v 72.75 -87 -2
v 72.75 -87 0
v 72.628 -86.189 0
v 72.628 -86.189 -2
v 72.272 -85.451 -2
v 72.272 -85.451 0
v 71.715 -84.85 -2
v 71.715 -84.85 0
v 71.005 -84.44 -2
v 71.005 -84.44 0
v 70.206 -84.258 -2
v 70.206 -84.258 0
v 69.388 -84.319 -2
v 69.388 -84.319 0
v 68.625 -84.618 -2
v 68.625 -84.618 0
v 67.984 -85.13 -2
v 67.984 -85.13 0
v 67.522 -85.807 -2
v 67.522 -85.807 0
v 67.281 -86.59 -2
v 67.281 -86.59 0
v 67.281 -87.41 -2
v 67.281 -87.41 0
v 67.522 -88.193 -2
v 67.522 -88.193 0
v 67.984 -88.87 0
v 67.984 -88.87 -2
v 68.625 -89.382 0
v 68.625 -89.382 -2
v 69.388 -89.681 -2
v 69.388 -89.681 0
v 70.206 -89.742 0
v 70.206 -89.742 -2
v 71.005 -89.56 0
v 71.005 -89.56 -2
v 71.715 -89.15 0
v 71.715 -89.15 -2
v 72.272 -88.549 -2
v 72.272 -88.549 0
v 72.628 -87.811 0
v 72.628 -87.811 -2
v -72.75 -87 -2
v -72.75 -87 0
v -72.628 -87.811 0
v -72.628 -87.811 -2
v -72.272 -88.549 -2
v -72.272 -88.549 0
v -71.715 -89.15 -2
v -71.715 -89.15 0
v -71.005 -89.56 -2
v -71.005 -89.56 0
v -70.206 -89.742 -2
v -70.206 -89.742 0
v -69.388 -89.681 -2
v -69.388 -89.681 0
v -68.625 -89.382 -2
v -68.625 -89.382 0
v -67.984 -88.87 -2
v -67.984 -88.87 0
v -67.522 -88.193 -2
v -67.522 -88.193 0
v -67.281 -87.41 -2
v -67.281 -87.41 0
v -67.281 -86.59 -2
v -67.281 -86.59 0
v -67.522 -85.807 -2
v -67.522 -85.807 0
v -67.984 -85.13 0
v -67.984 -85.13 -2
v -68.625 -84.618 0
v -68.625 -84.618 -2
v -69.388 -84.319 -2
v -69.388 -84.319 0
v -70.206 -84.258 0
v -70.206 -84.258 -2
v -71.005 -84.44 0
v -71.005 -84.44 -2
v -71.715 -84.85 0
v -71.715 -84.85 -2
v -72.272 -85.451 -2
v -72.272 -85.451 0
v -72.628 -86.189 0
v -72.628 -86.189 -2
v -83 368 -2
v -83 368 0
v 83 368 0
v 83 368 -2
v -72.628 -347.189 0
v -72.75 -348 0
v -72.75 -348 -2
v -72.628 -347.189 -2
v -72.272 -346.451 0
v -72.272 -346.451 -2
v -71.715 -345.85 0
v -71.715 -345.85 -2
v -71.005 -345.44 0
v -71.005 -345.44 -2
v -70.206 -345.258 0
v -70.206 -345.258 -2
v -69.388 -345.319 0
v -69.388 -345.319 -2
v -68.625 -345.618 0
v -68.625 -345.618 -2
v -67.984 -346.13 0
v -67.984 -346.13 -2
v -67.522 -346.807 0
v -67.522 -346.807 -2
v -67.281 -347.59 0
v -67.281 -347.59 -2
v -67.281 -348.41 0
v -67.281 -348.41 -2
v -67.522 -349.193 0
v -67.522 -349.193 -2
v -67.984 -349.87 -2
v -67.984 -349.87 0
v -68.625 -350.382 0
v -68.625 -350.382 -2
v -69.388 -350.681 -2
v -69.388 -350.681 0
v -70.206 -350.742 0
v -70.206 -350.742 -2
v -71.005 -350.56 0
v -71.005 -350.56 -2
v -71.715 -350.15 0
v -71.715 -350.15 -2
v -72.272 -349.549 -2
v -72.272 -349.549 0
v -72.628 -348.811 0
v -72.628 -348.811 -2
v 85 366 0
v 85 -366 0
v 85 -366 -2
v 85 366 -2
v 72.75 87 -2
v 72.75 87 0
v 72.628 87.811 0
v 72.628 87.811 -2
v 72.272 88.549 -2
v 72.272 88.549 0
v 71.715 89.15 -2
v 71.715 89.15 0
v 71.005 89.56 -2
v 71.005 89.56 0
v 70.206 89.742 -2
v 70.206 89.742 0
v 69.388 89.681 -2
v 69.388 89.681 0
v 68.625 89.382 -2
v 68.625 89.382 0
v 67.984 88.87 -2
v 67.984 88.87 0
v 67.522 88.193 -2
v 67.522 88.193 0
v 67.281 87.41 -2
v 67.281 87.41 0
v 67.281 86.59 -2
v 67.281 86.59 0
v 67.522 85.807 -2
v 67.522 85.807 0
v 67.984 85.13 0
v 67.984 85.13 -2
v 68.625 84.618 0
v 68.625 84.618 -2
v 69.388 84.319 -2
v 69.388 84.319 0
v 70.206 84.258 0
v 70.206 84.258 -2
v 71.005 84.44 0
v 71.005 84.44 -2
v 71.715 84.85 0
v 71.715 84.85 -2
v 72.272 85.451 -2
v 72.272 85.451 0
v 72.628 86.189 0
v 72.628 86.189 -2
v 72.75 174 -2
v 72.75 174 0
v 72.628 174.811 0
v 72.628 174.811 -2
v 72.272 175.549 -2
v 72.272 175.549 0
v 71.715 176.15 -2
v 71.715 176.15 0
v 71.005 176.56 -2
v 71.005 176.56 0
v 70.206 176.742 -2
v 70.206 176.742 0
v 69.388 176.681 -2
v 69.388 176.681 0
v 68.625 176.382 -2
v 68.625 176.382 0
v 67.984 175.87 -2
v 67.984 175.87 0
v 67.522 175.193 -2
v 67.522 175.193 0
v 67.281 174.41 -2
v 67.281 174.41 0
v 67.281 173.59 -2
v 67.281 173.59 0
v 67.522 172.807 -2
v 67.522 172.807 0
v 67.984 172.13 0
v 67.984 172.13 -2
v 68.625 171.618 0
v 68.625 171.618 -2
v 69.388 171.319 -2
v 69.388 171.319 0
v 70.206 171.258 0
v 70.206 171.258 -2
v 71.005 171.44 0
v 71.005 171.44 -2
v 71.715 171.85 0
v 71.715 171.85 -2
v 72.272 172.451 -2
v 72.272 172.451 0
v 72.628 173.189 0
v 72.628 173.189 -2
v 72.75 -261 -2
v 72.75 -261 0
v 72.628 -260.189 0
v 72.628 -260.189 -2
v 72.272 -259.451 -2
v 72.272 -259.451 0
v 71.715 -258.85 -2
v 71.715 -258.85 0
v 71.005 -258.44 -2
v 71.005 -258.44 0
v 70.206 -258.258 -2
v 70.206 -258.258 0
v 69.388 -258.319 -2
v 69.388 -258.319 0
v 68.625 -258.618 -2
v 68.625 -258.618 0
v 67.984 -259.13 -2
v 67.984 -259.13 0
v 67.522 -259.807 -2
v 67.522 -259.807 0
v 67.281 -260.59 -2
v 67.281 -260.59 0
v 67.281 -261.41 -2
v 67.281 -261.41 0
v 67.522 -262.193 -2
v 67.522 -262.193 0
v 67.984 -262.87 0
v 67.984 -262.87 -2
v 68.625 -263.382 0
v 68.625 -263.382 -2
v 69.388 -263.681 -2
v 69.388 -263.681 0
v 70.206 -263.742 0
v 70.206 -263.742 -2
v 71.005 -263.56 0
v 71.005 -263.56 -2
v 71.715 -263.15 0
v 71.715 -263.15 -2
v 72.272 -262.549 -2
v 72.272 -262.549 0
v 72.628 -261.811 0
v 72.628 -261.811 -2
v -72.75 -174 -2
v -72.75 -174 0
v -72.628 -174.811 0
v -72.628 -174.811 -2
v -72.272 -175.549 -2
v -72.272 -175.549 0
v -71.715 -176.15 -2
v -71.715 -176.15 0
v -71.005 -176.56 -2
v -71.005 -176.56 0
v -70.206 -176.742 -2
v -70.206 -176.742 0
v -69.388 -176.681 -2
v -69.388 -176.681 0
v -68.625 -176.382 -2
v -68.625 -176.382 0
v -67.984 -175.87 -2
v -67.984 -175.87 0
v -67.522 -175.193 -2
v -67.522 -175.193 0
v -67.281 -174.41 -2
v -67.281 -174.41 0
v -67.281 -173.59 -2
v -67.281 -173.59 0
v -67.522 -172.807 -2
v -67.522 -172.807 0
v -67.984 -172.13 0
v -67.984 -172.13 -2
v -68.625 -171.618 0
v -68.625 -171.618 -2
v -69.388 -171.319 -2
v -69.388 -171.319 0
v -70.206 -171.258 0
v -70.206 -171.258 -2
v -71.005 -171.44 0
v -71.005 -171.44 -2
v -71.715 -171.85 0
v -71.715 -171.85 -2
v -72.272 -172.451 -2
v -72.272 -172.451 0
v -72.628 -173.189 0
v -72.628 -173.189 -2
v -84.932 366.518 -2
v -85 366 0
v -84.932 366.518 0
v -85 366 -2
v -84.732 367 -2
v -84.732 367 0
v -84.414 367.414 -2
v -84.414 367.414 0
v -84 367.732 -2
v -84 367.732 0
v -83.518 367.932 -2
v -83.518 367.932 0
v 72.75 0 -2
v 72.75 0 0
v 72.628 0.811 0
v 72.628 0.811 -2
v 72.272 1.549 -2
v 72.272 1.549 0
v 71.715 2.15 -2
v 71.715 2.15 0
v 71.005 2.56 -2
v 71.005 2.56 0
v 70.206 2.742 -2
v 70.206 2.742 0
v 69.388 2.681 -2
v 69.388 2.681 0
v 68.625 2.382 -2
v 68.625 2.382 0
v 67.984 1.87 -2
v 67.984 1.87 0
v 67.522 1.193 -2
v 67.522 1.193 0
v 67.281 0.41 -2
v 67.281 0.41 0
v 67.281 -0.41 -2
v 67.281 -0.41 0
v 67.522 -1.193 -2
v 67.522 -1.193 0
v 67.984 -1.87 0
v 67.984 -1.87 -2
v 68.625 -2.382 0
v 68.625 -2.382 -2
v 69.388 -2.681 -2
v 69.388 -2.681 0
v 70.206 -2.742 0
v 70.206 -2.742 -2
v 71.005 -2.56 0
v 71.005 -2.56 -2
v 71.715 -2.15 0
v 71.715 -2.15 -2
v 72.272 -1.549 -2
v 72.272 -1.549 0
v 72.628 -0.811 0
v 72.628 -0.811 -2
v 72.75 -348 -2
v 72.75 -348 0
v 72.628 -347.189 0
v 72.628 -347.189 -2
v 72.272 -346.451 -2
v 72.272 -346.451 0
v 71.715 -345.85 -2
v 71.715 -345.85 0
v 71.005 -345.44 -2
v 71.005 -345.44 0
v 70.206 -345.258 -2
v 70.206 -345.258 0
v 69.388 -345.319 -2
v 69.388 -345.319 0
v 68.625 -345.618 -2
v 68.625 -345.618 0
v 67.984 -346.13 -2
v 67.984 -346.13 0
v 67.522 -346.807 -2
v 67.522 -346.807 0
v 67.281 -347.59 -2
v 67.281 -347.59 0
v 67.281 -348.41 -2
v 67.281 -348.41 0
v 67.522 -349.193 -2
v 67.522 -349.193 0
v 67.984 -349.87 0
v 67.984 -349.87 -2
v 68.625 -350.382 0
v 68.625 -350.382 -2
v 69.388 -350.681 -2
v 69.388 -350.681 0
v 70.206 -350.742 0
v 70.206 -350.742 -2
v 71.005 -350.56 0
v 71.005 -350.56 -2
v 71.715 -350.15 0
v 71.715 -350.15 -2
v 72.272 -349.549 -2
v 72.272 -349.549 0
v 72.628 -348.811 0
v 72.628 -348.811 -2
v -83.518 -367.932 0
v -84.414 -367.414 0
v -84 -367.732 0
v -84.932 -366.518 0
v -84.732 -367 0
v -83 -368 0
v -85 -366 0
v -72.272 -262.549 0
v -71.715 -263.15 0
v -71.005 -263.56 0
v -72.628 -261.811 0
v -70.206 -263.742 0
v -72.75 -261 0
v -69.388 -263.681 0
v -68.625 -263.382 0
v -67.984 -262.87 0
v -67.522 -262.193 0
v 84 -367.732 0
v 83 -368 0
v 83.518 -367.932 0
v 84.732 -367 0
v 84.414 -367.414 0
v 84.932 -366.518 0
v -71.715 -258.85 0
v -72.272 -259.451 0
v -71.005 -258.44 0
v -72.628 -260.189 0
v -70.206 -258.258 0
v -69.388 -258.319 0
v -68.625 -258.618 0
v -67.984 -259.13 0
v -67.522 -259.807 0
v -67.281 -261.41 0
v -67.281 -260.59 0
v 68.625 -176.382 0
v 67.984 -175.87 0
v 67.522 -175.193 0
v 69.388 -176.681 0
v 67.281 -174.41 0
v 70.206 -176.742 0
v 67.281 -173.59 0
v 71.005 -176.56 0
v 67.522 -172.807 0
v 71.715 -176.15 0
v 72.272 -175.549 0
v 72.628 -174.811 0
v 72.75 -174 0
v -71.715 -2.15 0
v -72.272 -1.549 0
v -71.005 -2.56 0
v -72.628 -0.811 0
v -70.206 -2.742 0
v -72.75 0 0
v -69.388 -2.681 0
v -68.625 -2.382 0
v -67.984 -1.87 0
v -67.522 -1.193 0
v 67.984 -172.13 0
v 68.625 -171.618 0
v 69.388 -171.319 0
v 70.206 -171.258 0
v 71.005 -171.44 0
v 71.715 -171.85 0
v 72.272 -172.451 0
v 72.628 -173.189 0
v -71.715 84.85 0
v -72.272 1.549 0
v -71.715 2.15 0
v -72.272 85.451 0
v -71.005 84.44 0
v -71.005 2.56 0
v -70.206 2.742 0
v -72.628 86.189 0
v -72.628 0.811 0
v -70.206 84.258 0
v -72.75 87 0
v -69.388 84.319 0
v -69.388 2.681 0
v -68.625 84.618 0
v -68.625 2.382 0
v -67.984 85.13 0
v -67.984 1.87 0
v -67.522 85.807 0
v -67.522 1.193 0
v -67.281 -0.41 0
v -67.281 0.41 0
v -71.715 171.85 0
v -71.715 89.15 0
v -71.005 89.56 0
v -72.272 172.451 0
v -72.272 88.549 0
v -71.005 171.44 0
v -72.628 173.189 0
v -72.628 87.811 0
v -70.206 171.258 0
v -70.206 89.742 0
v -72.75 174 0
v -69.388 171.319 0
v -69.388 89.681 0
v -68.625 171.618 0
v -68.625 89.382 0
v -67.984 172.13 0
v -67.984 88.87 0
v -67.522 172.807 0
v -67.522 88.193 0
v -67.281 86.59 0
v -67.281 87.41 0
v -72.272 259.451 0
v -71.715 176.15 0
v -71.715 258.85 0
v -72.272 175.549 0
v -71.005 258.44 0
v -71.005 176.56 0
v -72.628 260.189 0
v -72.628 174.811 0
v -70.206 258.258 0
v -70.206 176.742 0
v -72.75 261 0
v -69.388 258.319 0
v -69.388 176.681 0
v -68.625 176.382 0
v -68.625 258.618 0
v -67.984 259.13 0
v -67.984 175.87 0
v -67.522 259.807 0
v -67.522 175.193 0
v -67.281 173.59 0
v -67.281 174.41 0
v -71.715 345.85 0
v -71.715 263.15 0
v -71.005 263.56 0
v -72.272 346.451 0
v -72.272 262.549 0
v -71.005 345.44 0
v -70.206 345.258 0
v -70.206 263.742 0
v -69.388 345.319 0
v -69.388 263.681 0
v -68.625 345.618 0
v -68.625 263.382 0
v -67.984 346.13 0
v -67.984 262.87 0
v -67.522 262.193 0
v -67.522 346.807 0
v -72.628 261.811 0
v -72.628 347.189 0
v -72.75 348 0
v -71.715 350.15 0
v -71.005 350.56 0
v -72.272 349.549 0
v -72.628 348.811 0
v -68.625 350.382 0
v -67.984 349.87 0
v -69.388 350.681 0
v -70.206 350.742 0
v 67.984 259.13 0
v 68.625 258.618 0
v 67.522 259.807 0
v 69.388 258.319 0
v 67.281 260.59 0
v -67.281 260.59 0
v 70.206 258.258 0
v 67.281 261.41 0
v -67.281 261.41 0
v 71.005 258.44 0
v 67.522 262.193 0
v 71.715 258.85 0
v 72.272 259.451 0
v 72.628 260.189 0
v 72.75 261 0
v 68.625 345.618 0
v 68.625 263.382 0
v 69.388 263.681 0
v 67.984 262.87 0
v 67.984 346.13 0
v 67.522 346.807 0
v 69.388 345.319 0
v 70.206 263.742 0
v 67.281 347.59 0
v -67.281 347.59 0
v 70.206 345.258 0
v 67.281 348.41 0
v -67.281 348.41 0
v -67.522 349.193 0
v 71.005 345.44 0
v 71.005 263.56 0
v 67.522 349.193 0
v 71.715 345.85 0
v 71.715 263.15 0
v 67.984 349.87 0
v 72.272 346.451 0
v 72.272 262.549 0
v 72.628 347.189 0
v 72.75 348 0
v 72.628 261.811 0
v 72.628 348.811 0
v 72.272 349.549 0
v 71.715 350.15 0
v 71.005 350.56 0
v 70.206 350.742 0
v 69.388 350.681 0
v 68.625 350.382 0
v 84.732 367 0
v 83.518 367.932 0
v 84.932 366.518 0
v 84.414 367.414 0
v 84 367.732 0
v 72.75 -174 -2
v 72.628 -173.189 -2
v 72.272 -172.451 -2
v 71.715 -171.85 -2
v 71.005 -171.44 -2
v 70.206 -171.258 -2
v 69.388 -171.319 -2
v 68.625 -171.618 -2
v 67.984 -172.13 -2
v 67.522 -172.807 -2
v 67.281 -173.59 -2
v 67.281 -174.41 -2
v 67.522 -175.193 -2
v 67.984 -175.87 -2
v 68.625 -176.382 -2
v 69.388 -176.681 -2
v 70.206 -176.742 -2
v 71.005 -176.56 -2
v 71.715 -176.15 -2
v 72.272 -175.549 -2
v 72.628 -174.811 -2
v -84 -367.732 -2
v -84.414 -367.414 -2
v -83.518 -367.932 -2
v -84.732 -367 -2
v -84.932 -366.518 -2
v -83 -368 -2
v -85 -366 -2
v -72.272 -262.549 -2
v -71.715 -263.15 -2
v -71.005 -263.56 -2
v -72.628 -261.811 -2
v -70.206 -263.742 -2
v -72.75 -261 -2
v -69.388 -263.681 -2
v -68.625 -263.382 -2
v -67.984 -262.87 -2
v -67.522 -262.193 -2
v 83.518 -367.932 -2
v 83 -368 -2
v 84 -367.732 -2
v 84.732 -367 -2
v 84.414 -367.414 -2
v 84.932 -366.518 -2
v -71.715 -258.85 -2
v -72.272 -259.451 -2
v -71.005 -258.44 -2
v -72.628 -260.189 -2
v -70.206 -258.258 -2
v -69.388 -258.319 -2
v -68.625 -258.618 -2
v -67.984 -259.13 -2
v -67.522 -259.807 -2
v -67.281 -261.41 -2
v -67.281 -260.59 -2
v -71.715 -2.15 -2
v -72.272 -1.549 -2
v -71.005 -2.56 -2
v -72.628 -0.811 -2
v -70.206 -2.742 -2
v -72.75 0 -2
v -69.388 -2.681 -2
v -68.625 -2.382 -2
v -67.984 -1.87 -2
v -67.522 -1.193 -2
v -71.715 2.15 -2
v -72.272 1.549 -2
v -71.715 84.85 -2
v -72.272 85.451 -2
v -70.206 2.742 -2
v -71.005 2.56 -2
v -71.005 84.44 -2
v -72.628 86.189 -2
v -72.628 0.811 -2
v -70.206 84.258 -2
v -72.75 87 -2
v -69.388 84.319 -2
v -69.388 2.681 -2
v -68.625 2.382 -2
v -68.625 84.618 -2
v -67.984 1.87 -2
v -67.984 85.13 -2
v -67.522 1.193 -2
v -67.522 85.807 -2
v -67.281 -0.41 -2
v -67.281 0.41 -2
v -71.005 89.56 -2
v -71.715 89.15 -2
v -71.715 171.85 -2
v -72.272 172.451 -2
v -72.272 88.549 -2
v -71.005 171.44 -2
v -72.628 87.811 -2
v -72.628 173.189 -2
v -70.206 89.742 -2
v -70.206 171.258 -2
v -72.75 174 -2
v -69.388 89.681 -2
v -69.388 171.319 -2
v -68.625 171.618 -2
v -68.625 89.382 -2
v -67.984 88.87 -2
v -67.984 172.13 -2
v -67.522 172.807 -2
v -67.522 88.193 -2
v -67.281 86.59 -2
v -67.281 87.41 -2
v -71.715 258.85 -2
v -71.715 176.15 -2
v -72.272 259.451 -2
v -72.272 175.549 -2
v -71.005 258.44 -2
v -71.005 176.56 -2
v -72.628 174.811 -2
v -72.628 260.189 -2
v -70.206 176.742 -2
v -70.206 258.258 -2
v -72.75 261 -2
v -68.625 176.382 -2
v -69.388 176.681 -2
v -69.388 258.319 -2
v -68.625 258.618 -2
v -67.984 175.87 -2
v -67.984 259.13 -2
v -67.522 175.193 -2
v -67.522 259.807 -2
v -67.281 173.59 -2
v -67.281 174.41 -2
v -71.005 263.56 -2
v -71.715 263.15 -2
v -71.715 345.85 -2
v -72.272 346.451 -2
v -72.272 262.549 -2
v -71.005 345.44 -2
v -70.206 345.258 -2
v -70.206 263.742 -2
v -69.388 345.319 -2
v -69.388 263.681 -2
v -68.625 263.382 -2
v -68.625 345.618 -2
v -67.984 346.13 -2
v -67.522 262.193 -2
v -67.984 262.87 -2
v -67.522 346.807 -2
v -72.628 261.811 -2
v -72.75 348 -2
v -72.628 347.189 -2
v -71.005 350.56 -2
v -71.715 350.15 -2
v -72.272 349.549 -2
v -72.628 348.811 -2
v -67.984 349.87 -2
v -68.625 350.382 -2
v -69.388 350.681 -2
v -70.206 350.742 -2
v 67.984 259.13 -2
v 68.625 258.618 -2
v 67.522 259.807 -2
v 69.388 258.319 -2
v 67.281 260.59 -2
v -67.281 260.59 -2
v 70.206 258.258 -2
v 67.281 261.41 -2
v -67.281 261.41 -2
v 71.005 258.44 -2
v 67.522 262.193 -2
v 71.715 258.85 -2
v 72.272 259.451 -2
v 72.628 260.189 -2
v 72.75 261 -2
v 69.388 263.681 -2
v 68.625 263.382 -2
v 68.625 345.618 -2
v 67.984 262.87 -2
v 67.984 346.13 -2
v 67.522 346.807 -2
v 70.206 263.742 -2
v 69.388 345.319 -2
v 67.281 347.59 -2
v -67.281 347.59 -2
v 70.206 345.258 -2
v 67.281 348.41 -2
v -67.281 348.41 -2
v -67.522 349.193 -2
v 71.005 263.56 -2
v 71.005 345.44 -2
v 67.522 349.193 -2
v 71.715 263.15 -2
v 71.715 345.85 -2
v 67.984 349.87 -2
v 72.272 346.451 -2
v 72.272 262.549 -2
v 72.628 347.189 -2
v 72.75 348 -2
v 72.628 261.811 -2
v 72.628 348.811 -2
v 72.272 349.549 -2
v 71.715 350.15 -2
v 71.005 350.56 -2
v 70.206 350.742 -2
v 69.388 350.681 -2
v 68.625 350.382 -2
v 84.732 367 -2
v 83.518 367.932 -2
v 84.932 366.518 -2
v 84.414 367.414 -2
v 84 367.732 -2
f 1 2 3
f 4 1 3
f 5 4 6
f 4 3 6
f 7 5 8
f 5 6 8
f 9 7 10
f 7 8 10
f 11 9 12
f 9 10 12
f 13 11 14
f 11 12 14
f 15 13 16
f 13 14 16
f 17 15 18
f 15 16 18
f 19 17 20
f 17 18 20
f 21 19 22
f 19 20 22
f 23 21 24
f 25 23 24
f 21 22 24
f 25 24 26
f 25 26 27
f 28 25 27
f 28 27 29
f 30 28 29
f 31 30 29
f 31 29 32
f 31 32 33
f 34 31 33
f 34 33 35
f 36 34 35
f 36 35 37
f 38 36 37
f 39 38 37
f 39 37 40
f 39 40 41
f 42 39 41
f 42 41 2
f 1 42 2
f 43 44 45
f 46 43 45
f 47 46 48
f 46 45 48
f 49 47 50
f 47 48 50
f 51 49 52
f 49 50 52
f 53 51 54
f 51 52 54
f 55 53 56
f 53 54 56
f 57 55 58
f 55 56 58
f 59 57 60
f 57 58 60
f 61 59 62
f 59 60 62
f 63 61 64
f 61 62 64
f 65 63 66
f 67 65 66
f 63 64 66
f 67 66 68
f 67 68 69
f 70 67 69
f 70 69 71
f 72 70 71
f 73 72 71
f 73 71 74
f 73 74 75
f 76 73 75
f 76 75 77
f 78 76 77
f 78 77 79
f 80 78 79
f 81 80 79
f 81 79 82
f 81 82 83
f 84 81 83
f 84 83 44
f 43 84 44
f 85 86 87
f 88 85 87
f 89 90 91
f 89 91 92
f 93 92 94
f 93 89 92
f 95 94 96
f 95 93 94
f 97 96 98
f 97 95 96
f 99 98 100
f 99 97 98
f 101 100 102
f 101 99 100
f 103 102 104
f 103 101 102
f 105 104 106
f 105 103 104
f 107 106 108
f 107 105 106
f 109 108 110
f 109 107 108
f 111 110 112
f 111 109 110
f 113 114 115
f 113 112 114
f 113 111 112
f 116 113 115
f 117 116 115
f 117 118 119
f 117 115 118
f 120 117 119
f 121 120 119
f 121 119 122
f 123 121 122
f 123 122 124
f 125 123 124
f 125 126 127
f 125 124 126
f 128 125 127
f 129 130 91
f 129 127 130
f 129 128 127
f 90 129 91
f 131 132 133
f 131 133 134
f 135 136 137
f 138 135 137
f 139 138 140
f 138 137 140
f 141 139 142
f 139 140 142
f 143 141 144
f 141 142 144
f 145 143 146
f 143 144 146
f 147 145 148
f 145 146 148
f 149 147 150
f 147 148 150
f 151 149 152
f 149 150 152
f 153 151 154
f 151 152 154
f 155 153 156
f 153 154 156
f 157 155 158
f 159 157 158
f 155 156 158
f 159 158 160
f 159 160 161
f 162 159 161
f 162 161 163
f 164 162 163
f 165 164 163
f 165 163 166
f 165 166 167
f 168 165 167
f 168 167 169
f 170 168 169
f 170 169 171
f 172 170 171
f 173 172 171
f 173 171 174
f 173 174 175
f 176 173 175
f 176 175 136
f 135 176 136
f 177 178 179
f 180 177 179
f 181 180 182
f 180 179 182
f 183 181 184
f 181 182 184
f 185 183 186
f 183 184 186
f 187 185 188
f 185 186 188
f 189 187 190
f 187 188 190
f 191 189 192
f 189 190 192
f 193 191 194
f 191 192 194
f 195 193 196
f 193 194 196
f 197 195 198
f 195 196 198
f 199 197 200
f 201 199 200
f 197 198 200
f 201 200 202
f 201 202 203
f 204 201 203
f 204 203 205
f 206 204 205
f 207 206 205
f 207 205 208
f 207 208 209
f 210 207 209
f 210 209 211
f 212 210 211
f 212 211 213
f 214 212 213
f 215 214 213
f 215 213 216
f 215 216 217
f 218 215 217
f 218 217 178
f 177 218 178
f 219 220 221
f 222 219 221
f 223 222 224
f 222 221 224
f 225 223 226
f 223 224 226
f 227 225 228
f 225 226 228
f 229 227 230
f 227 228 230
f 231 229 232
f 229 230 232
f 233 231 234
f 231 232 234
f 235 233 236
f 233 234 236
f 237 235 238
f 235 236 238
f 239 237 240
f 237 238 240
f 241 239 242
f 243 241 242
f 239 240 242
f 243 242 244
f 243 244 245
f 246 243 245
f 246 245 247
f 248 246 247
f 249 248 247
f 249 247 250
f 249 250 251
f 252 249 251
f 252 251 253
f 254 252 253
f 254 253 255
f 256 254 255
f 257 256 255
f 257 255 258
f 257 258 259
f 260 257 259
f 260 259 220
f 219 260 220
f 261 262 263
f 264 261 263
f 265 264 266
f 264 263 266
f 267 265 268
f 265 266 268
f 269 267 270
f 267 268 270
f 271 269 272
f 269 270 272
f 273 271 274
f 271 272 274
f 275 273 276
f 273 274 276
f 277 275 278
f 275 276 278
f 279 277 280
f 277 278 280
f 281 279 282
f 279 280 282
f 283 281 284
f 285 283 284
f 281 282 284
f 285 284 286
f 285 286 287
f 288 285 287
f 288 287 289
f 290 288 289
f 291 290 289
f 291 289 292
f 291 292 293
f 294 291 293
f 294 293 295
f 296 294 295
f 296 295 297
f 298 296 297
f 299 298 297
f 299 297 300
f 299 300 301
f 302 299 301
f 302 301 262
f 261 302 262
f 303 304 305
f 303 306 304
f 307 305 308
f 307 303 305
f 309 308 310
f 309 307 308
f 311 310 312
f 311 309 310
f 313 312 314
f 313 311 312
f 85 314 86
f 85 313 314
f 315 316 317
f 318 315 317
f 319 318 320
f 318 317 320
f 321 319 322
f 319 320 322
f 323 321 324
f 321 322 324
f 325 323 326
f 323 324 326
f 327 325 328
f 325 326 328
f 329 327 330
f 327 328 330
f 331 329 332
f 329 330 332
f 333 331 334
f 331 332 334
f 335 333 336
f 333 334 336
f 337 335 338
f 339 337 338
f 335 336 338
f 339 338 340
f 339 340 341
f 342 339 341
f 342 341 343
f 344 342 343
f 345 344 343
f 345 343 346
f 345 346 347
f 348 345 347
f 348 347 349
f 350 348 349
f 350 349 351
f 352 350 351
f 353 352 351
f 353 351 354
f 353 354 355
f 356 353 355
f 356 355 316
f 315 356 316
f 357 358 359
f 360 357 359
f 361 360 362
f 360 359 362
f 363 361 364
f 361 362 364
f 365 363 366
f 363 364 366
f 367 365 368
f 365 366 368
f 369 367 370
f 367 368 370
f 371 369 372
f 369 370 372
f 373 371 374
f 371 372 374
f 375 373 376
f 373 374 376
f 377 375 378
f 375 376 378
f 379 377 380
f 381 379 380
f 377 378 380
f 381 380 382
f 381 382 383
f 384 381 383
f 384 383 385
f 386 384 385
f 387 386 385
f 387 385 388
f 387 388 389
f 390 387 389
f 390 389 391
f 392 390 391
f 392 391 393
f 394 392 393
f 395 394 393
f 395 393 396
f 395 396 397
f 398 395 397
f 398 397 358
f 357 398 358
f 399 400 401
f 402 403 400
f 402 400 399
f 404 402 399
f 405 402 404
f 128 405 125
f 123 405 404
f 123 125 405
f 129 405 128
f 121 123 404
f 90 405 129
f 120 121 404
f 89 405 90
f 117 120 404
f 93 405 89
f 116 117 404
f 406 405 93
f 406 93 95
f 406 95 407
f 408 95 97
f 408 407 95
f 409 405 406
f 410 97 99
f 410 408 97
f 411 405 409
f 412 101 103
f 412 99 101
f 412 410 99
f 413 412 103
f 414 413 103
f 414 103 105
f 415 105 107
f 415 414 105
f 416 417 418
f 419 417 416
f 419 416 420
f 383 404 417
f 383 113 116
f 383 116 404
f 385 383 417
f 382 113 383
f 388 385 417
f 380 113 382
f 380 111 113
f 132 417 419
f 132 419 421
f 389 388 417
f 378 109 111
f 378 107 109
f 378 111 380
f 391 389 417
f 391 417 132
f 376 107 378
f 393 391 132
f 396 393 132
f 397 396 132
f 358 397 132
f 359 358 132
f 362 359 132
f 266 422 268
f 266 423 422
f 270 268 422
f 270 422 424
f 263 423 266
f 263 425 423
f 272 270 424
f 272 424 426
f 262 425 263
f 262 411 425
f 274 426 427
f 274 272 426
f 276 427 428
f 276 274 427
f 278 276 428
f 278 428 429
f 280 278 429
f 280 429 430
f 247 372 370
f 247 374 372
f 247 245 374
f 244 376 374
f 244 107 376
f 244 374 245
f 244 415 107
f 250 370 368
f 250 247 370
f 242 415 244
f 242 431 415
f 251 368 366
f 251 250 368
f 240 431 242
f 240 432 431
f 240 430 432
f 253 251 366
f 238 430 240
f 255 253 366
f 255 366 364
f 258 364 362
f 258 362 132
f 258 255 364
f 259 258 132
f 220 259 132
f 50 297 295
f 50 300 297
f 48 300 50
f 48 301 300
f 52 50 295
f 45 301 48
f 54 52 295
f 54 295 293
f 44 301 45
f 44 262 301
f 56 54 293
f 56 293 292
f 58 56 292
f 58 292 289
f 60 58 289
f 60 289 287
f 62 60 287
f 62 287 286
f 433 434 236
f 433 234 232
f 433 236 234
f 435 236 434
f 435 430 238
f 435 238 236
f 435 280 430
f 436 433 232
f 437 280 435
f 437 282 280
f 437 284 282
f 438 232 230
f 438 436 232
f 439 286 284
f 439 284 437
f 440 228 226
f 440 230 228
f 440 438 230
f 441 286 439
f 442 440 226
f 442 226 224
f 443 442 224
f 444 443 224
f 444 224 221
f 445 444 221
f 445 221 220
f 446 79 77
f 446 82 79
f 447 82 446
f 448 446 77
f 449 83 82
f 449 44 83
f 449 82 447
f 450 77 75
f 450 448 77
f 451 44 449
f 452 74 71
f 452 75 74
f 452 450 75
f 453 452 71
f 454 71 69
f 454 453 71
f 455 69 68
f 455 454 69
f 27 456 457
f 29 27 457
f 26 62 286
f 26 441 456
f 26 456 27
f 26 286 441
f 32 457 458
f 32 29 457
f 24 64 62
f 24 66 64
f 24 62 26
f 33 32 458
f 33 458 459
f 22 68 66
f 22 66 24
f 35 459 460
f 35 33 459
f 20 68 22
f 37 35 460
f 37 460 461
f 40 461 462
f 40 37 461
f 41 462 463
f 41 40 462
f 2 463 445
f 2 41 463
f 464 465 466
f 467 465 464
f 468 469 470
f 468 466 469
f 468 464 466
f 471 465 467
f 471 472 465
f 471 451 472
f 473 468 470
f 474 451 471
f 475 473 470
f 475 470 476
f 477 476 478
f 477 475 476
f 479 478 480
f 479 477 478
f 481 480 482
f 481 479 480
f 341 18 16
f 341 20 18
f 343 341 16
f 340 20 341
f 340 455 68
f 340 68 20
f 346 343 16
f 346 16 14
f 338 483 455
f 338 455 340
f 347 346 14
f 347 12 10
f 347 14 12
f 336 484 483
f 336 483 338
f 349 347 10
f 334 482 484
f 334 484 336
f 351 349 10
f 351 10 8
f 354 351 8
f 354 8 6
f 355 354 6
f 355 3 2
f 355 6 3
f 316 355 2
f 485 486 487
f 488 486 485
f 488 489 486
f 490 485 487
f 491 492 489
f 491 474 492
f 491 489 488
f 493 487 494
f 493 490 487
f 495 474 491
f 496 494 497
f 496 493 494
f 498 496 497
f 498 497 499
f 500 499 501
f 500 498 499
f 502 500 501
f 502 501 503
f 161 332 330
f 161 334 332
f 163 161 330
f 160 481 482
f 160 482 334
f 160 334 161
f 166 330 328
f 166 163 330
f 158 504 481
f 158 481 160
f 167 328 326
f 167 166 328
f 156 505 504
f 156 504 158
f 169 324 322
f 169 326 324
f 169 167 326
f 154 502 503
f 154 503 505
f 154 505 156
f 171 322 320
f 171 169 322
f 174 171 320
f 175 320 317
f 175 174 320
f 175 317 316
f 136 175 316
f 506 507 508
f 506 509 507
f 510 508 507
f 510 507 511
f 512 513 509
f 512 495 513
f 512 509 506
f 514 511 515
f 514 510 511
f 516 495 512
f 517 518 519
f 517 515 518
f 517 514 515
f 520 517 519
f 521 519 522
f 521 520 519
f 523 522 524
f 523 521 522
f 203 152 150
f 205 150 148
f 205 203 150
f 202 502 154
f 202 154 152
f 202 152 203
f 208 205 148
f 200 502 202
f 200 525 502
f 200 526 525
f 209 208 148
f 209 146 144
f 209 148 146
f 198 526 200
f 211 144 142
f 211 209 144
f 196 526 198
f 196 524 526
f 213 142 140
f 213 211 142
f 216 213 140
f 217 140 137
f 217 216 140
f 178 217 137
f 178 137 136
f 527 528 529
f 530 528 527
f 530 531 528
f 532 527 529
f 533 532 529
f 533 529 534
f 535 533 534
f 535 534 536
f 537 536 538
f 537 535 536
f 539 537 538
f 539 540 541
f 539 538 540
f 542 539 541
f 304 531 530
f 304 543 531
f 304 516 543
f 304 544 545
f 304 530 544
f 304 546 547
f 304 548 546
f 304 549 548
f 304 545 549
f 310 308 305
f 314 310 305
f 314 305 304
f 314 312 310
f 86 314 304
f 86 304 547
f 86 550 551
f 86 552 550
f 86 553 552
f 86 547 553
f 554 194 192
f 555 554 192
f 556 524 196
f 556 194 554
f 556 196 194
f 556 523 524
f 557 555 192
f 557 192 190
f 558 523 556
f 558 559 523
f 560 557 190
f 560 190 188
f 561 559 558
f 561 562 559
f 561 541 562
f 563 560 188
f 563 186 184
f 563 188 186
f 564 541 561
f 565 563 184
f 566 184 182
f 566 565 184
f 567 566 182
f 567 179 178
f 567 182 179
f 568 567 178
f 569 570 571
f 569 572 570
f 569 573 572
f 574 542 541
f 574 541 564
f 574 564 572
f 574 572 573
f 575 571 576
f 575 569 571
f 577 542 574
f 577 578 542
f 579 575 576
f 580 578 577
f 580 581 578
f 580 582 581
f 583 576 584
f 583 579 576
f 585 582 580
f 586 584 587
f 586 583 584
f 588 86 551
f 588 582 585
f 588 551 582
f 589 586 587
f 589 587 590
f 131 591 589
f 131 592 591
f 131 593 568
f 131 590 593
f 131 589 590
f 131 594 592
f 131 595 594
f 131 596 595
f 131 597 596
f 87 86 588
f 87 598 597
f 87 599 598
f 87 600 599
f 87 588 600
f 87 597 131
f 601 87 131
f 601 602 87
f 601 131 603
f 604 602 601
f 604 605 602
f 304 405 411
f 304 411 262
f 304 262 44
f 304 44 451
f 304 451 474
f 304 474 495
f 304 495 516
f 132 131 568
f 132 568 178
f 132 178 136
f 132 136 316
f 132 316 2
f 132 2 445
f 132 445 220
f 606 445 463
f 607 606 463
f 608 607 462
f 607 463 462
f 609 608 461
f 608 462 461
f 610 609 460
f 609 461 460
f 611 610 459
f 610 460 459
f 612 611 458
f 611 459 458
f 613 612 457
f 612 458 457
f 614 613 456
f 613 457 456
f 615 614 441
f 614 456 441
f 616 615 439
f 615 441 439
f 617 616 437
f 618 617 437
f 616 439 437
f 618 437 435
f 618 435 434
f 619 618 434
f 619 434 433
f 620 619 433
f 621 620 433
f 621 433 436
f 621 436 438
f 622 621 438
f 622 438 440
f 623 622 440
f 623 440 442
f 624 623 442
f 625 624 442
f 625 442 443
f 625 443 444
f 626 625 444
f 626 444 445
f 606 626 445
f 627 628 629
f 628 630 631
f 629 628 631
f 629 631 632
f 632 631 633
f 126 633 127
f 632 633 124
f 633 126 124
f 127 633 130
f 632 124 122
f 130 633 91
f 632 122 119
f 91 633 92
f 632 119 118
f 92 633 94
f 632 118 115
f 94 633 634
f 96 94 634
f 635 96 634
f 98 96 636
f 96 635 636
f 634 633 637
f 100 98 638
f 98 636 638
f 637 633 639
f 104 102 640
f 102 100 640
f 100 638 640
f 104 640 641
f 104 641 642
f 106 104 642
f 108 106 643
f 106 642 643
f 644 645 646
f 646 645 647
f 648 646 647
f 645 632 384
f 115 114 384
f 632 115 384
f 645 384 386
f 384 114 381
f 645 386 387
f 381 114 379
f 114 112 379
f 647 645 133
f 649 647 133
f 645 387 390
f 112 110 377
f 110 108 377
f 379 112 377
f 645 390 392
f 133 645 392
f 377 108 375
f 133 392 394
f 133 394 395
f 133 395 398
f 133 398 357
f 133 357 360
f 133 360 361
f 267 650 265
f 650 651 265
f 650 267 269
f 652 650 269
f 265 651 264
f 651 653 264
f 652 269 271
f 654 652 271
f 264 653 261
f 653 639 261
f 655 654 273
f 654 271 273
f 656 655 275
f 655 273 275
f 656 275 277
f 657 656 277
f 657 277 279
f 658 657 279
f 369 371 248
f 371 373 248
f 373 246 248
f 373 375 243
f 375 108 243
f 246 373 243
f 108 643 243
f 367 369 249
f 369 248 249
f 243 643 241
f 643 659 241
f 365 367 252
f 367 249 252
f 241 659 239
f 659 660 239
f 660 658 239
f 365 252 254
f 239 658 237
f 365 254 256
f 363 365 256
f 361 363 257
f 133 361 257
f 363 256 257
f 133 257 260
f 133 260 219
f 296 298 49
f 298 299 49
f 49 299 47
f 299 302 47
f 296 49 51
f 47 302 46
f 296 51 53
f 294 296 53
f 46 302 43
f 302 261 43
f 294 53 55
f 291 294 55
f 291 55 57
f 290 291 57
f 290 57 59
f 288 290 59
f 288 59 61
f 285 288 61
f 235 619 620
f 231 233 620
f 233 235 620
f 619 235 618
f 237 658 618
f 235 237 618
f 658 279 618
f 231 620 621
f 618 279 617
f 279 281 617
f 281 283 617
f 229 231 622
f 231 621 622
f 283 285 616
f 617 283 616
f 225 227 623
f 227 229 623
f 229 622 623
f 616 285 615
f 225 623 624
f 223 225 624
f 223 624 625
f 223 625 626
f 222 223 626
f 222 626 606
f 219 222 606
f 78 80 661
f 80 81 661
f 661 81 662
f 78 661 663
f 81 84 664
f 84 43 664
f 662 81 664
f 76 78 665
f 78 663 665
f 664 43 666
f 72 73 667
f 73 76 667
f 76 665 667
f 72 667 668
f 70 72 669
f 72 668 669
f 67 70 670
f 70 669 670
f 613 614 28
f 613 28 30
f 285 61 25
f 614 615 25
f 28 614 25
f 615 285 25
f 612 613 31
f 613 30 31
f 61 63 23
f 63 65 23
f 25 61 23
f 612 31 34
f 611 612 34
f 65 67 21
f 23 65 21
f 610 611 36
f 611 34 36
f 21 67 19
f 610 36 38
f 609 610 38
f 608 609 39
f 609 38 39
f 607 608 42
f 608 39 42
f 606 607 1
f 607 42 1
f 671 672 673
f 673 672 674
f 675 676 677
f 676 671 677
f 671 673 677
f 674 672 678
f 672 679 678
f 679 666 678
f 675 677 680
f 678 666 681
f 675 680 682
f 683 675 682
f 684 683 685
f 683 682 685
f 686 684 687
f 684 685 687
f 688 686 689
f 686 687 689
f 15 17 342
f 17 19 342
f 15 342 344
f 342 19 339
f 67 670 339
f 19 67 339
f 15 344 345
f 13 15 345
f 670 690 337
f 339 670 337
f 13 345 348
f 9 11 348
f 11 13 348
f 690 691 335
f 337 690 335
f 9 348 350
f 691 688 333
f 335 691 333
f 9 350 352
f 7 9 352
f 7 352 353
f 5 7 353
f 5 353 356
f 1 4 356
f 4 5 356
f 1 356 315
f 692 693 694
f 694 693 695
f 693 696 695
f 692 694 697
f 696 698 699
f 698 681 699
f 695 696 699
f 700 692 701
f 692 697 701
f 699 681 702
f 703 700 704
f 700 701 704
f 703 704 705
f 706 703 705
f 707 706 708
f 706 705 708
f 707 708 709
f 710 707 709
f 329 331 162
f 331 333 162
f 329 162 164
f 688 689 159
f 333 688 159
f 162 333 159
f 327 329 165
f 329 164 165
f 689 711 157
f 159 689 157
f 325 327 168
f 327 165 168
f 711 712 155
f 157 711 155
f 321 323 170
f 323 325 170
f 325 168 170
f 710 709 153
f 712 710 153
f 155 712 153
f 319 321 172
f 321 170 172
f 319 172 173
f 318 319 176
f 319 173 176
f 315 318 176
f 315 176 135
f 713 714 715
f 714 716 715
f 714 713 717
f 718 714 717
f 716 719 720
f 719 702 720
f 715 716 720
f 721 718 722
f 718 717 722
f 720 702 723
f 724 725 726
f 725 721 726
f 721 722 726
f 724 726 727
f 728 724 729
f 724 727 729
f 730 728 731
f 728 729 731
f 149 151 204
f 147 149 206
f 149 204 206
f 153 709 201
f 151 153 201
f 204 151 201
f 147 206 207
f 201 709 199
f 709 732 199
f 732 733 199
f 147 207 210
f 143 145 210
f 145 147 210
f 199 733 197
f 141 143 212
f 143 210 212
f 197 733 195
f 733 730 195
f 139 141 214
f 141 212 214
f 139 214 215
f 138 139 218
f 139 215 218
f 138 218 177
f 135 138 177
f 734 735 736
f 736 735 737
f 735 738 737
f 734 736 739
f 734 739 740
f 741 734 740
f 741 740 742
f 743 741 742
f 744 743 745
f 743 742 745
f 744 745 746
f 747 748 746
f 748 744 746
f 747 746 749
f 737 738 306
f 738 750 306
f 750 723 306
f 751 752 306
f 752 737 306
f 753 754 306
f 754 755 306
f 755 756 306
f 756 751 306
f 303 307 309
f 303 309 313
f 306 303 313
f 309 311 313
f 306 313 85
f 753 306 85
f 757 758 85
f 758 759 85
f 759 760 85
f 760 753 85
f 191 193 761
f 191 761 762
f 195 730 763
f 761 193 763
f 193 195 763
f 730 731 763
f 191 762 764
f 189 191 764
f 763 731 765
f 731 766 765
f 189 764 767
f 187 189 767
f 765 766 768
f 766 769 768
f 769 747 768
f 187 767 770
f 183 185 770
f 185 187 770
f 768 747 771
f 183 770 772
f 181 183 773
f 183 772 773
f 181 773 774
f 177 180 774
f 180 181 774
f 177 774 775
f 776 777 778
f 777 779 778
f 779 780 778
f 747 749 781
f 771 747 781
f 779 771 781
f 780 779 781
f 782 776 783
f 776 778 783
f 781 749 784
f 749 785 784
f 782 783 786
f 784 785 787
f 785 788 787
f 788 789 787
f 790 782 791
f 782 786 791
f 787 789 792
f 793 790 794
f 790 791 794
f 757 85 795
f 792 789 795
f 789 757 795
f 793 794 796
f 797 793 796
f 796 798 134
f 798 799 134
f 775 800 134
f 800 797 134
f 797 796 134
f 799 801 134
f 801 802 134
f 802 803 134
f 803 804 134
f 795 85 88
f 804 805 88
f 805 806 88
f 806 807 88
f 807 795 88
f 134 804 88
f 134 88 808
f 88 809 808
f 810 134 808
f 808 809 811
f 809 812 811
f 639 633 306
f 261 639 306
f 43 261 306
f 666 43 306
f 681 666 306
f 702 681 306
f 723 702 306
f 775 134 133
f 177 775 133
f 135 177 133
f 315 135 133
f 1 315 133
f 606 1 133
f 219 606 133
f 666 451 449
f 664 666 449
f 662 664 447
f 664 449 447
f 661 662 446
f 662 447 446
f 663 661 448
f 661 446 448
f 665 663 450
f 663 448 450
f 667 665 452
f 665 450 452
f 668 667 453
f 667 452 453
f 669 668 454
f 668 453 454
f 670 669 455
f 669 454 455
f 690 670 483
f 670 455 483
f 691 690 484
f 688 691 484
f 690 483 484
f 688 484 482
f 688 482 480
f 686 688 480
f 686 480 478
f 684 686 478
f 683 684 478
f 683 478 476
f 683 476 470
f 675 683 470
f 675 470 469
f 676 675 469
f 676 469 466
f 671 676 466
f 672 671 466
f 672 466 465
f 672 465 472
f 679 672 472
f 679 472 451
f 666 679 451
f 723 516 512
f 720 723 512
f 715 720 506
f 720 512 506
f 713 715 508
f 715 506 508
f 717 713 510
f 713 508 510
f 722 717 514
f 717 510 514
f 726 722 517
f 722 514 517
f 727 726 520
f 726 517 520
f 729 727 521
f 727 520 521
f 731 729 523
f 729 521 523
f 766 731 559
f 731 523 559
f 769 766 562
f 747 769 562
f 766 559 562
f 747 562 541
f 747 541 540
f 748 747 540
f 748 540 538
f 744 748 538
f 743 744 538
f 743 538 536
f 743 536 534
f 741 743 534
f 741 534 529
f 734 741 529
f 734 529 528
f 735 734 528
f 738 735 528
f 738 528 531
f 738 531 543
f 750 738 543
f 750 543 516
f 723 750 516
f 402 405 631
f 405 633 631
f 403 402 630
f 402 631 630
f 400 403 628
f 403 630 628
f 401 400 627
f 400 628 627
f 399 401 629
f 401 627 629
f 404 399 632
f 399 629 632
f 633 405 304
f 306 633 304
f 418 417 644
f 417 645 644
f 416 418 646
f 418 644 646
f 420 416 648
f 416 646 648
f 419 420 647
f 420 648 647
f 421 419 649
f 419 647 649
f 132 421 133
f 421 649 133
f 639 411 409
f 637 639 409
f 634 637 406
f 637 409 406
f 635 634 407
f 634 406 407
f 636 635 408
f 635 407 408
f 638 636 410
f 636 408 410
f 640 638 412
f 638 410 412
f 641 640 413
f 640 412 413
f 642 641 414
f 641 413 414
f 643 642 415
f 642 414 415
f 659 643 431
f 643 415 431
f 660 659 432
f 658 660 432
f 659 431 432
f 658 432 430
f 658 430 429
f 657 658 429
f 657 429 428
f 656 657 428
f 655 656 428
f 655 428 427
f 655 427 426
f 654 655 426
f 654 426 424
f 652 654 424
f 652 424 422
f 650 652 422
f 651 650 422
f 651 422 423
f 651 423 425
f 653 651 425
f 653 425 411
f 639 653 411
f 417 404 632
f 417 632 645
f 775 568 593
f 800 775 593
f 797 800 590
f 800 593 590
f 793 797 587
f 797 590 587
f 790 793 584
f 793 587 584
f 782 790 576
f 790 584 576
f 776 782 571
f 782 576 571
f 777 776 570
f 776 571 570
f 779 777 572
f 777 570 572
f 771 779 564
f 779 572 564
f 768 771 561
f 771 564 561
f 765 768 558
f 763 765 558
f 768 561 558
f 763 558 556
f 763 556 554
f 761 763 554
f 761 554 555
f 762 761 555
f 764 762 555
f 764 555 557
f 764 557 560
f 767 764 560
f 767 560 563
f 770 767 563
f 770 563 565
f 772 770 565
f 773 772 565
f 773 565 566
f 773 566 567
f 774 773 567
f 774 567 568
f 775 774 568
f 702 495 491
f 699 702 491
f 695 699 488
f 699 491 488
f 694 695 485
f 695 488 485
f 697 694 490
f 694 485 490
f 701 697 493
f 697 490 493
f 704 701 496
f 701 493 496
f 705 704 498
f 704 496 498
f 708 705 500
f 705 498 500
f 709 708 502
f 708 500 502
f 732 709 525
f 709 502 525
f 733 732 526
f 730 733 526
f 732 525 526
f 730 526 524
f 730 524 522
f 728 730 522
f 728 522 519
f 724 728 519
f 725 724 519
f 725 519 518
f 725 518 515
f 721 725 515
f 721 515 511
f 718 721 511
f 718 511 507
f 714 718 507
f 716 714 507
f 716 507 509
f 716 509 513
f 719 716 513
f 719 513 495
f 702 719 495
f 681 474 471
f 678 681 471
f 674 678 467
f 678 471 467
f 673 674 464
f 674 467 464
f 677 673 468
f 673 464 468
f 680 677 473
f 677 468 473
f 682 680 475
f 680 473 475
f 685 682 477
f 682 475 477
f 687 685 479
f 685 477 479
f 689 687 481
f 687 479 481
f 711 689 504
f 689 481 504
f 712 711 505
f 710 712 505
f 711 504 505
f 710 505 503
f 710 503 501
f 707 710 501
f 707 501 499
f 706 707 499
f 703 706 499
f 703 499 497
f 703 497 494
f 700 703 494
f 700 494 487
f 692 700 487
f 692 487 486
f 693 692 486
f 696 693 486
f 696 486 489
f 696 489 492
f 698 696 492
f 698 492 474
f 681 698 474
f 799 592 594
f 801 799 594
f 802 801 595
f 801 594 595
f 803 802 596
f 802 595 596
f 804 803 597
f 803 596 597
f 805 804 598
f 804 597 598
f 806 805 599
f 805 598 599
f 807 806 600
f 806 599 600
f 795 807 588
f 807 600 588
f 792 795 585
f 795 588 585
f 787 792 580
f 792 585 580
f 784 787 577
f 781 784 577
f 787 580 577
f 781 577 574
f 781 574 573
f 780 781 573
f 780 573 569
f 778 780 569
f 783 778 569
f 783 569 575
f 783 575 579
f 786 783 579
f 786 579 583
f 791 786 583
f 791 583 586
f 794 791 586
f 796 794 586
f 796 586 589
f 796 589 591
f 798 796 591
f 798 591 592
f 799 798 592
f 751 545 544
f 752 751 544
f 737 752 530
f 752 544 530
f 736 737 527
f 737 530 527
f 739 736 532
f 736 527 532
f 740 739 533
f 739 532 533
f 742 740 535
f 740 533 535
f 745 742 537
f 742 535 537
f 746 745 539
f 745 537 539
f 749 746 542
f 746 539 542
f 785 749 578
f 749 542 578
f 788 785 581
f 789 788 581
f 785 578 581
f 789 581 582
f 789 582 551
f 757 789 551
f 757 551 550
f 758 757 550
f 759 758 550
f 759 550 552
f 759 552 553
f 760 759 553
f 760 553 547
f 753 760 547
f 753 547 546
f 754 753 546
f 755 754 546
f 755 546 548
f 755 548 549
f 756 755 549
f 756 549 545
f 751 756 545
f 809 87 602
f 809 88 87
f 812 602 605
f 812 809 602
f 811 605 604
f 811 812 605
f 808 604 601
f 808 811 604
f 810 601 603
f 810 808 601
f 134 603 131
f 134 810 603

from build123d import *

# Parameters (mm, degrees)
SKETCH1_W            = 170
SKETCH1_H            = 736
BASE_FLANGE1_DEPTH   = 2
M5_CLEARANCE_HOLE1_D = 5.5
CRVPATTERN1_COUNT    = 9
CRVPATTERN1_PITCH    = 87
MIRROR1_COPY_1_D     = 5.5
MIRROR1_COPY_2_D     = 5.5
MIRROR1_COPY_3_D     = 5.5
MIRROR1_COPY_4_D     = 5.5
MIRROR1_COPY_5_D     = 5.5
MIRROR1_COPY_6_D     = 5.5
MIRROR1_COPY_7_D     = 5.5
MIRROR1_COPY_8_D     = 5.5
FILLET1_R            = 2


# Sheet-metal steps are written as plain solids
with BuildPart() as part:
    # Sketch1 → Base-Flange1 (new body)
    with BuildSketch(Plane.XY):
        Rectangle(SKETCH1_W, SKETCH1_H)
    extrude(amount=-BASE_FLANGE1_DEPTH)

    # M5 Clearance Hole1 (through all)
    with Locations(Plane(origin=(0, 0, -2), x_dir=(-1, 0, 0), z_dir=(0, 0, -1))):
        with Locations((-70, -348)):
            m5_clearance_hole1 = Hole(M5_CLEARANCE_HOLE1_D / 2)

    # CrvPattern1: M5 Clearance Hole1 ×9
    with Locations(*[(0, i * CRVPATTERN1_PITCH, 0) for i in range(1, CRVPATTERN1_COUNT)]):
        add(m5_clearance_hole1, mode=Mode.SUBTRACT)

    # Mirror1: M5 Clearance Hole1 across plane
    add(m5_clearance_hole1.mirror(Plane(origin=(0, 0, 0), x_dir=(0, 0, 1), z_dir=(1, 0, 0))), mode=Mode.SUBTRACT)

    # Mirror1 copy 1 (through all)
    with Locations(Plane(origin=(0, 87, -2), x_dir=(1, 0, 0), z_dir=(0, 0, -1))):
        with Locations((-70, 348)):
            Hole(MIRROR1_COPY_1_D / 2)

    # Mirror1 copy 2 (through all)
    with Locations(Plane(origin=(0, 174, -2), x_dir=(1, 0, 0), z_dir=(0, 0, -1))):
        with Locations((-70, 348)):
            Hole(MIRROR1_COPY_2_D / 2)

    # Mirror1 copy 3 (through all)
    with Locations(Plane(origin=(0, 261, -2), x_dir=(1, 0, 0), z_dir=(0, 0, -1))):
        with Locations((-70, 348)):
            Hole(MIRROR1_COPY_3_D / 2)

    # Mirror1 copy 4 (through all)
    with Locations(Plane(origin=(0, 348, -2), x_dir=(1, 0, 0), z_dir=(0, 0, -1))):
        with Locations((-70, 348)):
            Hole(MIRROR1_COPY_4_D / 2)

    # Mirror1 copy 5 (through all)
    with Locations(Plane(origin=(0, 435, -2), x_dir=(1, 0, 0), z_dir=(0, 0, -1))):
        with Locations((-70, 348)):
            Hole(MIRROR1_COPY_5_D / 2)

    # Mirror1 copy 6 (through all)
    with Locations(Plane(origin=(0, 522, -2), x_dir=(1, 0, 0), z_dir=(0, 0, -1))):
        with Locations((-70, 348)):
            Hole(MIRROR1_COPY_6_D / 2)

    # Mirror1 copy 7 (through all)
    with Locations(Plane(origin=(0, 609, -2), x_dir=(1, 0, 0), z_dir=(0, 0, -1))):
        with Locations((-70, 348)):
            Hole(MIRROR1_COPY_7_D / 2)

    # Mirror1 copy 8 (through all)
    with Locations(Plane(origin=(0, 696, -2), x_dir=(1, 0, 0), z_dir=(0, 0, -1))):
        with Locations((-70, 348)):
            Hole(MIRROR1_COPY_8_D / 2)

    # Fillet1
    fillet1_edges = [part.edges().sort_by_distance(p)[0] for p in [
        (-85, 368, -1),
        (85, 368, -1),
        (85, -368, -1),
        (-85, -368, -1),
    ]]
    fillet(fillet1_edges, radius=FILLET1_R)


solid = part.part
